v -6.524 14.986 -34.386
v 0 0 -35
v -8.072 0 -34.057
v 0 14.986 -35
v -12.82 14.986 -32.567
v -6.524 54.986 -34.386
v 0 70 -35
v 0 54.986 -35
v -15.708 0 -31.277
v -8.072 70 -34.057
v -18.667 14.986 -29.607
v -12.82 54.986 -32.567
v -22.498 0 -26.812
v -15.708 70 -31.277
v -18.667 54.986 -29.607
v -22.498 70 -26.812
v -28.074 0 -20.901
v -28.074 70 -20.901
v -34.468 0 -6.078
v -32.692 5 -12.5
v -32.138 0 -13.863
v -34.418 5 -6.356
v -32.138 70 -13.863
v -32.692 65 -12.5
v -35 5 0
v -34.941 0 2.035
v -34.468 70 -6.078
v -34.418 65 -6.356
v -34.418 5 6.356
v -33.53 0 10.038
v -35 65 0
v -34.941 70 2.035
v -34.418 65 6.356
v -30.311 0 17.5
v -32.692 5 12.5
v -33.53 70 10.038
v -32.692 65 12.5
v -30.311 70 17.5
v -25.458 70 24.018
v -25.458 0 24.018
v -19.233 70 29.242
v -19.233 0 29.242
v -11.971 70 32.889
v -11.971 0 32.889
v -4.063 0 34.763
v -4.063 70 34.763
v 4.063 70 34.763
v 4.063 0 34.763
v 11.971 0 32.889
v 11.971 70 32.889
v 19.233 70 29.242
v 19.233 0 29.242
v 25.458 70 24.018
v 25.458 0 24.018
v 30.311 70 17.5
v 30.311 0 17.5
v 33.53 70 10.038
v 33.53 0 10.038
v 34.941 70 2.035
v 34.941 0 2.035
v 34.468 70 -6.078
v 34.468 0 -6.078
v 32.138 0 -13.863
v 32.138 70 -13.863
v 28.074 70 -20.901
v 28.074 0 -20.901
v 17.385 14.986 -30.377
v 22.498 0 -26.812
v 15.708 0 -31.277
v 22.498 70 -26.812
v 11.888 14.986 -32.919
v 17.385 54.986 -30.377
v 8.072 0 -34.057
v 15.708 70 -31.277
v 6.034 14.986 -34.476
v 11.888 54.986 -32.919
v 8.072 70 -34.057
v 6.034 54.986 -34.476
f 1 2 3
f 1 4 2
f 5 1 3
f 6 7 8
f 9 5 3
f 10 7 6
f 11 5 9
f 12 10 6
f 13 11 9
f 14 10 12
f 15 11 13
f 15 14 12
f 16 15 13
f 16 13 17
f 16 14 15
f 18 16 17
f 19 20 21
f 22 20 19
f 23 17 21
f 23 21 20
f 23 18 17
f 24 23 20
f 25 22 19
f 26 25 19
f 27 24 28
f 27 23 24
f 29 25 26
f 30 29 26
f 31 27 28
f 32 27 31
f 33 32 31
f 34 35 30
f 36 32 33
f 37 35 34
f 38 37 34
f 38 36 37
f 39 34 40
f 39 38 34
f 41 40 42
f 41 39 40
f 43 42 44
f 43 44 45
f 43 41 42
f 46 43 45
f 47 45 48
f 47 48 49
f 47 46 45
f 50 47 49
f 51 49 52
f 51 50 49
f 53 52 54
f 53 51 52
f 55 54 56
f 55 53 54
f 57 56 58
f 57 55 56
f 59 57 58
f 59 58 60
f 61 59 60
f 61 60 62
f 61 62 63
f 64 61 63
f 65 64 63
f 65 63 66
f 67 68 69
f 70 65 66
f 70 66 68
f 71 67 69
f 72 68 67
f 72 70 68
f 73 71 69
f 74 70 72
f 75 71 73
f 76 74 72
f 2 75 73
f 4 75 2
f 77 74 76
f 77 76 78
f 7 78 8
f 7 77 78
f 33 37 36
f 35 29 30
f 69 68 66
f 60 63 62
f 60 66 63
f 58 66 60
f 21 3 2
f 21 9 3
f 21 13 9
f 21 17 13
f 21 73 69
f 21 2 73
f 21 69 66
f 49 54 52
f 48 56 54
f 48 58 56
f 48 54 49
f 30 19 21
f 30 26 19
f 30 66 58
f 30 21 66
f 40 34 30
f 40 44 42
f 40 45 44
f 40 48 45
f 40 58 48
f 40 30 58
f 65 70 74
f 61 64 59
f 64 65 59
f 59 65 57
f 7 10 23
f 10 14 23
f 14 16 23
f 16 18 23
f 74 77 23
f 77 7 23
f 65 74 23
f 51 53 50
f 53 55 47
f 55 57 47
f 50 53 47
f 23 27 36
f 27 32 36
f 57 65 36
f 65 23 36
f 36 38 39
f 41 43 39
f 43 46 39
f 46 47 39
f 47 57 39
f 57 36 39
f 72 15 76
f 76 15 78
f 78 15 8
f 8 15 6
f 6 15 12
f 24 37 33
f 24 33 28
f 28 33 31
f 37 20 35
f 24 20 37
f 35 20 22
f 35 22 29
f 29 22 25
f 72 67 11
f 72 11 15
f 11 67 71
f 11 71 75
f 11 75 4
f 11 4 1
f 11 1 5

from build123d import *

# Parameters (mm, degrees)
SKETCH1_W           = 35
SKETCH1_H           = 70
CUT_EXTRUDE17_DEPTH = 2.5
CUT_EXTRUDE25_DEPTH = 116


with BuildPart() as part:
    # Sketch1 → Revolve1 (revolve)
    with BuildSketch(Plane.XY, mode=Mode.PRIVATE) as revolve1_sk:
        with Locations((17.5, 35)):
            Rectangle(SKETCH1_W, SKETCH1_H)
    revolve(revolve1_sk.sketch.rotate(Axis((0, 0, 0), (0, 1, 0)), 90), axis=Axis((0, 0, 0), (0, 1, 0)))

    # 3DSketch2 → Cut-Extrude17 (cut)
    with BuildSketch(Plane(origin=(-32.691742077, 65, 12.5), x_dir=(0, -0.923076923076923, -0.38461538461538475), z_dir=(1, 0, 0))):
        Polygon((0, 0), (9.615384615, 23.076923077), (65, 0), (55.384615385, -23.076923077), align=None)
    extrude(amount=-CUT_EXTRUDE17_DEPTH, mode=Mode.SUBTRACT)

    # 3DSketch3 → Cut-Extrude25 (cut, along a direction that is not the sketch's normal)
    with BuildSketch(Plane(origin=(-18.666557597, 54.986311826, -29.606749695), x_dir=(0.6694273156469549, -0.7427399140993083, -0.014299967463753989), z_dir=(0.021356621715658074, -1.1658435530169433e-15, 0.9997719213445107))):
        Polygon((0, 0), (24.145055974, 26.783201302), (53.854652538, 0), (29.709596564, -26.783201302), align=None)
    extrude(amount=-CUT_EXTRUDE25_DEPTH, dir=(0, 0, 1), mode=Mode.SUBTRACT)


solid = part.part
